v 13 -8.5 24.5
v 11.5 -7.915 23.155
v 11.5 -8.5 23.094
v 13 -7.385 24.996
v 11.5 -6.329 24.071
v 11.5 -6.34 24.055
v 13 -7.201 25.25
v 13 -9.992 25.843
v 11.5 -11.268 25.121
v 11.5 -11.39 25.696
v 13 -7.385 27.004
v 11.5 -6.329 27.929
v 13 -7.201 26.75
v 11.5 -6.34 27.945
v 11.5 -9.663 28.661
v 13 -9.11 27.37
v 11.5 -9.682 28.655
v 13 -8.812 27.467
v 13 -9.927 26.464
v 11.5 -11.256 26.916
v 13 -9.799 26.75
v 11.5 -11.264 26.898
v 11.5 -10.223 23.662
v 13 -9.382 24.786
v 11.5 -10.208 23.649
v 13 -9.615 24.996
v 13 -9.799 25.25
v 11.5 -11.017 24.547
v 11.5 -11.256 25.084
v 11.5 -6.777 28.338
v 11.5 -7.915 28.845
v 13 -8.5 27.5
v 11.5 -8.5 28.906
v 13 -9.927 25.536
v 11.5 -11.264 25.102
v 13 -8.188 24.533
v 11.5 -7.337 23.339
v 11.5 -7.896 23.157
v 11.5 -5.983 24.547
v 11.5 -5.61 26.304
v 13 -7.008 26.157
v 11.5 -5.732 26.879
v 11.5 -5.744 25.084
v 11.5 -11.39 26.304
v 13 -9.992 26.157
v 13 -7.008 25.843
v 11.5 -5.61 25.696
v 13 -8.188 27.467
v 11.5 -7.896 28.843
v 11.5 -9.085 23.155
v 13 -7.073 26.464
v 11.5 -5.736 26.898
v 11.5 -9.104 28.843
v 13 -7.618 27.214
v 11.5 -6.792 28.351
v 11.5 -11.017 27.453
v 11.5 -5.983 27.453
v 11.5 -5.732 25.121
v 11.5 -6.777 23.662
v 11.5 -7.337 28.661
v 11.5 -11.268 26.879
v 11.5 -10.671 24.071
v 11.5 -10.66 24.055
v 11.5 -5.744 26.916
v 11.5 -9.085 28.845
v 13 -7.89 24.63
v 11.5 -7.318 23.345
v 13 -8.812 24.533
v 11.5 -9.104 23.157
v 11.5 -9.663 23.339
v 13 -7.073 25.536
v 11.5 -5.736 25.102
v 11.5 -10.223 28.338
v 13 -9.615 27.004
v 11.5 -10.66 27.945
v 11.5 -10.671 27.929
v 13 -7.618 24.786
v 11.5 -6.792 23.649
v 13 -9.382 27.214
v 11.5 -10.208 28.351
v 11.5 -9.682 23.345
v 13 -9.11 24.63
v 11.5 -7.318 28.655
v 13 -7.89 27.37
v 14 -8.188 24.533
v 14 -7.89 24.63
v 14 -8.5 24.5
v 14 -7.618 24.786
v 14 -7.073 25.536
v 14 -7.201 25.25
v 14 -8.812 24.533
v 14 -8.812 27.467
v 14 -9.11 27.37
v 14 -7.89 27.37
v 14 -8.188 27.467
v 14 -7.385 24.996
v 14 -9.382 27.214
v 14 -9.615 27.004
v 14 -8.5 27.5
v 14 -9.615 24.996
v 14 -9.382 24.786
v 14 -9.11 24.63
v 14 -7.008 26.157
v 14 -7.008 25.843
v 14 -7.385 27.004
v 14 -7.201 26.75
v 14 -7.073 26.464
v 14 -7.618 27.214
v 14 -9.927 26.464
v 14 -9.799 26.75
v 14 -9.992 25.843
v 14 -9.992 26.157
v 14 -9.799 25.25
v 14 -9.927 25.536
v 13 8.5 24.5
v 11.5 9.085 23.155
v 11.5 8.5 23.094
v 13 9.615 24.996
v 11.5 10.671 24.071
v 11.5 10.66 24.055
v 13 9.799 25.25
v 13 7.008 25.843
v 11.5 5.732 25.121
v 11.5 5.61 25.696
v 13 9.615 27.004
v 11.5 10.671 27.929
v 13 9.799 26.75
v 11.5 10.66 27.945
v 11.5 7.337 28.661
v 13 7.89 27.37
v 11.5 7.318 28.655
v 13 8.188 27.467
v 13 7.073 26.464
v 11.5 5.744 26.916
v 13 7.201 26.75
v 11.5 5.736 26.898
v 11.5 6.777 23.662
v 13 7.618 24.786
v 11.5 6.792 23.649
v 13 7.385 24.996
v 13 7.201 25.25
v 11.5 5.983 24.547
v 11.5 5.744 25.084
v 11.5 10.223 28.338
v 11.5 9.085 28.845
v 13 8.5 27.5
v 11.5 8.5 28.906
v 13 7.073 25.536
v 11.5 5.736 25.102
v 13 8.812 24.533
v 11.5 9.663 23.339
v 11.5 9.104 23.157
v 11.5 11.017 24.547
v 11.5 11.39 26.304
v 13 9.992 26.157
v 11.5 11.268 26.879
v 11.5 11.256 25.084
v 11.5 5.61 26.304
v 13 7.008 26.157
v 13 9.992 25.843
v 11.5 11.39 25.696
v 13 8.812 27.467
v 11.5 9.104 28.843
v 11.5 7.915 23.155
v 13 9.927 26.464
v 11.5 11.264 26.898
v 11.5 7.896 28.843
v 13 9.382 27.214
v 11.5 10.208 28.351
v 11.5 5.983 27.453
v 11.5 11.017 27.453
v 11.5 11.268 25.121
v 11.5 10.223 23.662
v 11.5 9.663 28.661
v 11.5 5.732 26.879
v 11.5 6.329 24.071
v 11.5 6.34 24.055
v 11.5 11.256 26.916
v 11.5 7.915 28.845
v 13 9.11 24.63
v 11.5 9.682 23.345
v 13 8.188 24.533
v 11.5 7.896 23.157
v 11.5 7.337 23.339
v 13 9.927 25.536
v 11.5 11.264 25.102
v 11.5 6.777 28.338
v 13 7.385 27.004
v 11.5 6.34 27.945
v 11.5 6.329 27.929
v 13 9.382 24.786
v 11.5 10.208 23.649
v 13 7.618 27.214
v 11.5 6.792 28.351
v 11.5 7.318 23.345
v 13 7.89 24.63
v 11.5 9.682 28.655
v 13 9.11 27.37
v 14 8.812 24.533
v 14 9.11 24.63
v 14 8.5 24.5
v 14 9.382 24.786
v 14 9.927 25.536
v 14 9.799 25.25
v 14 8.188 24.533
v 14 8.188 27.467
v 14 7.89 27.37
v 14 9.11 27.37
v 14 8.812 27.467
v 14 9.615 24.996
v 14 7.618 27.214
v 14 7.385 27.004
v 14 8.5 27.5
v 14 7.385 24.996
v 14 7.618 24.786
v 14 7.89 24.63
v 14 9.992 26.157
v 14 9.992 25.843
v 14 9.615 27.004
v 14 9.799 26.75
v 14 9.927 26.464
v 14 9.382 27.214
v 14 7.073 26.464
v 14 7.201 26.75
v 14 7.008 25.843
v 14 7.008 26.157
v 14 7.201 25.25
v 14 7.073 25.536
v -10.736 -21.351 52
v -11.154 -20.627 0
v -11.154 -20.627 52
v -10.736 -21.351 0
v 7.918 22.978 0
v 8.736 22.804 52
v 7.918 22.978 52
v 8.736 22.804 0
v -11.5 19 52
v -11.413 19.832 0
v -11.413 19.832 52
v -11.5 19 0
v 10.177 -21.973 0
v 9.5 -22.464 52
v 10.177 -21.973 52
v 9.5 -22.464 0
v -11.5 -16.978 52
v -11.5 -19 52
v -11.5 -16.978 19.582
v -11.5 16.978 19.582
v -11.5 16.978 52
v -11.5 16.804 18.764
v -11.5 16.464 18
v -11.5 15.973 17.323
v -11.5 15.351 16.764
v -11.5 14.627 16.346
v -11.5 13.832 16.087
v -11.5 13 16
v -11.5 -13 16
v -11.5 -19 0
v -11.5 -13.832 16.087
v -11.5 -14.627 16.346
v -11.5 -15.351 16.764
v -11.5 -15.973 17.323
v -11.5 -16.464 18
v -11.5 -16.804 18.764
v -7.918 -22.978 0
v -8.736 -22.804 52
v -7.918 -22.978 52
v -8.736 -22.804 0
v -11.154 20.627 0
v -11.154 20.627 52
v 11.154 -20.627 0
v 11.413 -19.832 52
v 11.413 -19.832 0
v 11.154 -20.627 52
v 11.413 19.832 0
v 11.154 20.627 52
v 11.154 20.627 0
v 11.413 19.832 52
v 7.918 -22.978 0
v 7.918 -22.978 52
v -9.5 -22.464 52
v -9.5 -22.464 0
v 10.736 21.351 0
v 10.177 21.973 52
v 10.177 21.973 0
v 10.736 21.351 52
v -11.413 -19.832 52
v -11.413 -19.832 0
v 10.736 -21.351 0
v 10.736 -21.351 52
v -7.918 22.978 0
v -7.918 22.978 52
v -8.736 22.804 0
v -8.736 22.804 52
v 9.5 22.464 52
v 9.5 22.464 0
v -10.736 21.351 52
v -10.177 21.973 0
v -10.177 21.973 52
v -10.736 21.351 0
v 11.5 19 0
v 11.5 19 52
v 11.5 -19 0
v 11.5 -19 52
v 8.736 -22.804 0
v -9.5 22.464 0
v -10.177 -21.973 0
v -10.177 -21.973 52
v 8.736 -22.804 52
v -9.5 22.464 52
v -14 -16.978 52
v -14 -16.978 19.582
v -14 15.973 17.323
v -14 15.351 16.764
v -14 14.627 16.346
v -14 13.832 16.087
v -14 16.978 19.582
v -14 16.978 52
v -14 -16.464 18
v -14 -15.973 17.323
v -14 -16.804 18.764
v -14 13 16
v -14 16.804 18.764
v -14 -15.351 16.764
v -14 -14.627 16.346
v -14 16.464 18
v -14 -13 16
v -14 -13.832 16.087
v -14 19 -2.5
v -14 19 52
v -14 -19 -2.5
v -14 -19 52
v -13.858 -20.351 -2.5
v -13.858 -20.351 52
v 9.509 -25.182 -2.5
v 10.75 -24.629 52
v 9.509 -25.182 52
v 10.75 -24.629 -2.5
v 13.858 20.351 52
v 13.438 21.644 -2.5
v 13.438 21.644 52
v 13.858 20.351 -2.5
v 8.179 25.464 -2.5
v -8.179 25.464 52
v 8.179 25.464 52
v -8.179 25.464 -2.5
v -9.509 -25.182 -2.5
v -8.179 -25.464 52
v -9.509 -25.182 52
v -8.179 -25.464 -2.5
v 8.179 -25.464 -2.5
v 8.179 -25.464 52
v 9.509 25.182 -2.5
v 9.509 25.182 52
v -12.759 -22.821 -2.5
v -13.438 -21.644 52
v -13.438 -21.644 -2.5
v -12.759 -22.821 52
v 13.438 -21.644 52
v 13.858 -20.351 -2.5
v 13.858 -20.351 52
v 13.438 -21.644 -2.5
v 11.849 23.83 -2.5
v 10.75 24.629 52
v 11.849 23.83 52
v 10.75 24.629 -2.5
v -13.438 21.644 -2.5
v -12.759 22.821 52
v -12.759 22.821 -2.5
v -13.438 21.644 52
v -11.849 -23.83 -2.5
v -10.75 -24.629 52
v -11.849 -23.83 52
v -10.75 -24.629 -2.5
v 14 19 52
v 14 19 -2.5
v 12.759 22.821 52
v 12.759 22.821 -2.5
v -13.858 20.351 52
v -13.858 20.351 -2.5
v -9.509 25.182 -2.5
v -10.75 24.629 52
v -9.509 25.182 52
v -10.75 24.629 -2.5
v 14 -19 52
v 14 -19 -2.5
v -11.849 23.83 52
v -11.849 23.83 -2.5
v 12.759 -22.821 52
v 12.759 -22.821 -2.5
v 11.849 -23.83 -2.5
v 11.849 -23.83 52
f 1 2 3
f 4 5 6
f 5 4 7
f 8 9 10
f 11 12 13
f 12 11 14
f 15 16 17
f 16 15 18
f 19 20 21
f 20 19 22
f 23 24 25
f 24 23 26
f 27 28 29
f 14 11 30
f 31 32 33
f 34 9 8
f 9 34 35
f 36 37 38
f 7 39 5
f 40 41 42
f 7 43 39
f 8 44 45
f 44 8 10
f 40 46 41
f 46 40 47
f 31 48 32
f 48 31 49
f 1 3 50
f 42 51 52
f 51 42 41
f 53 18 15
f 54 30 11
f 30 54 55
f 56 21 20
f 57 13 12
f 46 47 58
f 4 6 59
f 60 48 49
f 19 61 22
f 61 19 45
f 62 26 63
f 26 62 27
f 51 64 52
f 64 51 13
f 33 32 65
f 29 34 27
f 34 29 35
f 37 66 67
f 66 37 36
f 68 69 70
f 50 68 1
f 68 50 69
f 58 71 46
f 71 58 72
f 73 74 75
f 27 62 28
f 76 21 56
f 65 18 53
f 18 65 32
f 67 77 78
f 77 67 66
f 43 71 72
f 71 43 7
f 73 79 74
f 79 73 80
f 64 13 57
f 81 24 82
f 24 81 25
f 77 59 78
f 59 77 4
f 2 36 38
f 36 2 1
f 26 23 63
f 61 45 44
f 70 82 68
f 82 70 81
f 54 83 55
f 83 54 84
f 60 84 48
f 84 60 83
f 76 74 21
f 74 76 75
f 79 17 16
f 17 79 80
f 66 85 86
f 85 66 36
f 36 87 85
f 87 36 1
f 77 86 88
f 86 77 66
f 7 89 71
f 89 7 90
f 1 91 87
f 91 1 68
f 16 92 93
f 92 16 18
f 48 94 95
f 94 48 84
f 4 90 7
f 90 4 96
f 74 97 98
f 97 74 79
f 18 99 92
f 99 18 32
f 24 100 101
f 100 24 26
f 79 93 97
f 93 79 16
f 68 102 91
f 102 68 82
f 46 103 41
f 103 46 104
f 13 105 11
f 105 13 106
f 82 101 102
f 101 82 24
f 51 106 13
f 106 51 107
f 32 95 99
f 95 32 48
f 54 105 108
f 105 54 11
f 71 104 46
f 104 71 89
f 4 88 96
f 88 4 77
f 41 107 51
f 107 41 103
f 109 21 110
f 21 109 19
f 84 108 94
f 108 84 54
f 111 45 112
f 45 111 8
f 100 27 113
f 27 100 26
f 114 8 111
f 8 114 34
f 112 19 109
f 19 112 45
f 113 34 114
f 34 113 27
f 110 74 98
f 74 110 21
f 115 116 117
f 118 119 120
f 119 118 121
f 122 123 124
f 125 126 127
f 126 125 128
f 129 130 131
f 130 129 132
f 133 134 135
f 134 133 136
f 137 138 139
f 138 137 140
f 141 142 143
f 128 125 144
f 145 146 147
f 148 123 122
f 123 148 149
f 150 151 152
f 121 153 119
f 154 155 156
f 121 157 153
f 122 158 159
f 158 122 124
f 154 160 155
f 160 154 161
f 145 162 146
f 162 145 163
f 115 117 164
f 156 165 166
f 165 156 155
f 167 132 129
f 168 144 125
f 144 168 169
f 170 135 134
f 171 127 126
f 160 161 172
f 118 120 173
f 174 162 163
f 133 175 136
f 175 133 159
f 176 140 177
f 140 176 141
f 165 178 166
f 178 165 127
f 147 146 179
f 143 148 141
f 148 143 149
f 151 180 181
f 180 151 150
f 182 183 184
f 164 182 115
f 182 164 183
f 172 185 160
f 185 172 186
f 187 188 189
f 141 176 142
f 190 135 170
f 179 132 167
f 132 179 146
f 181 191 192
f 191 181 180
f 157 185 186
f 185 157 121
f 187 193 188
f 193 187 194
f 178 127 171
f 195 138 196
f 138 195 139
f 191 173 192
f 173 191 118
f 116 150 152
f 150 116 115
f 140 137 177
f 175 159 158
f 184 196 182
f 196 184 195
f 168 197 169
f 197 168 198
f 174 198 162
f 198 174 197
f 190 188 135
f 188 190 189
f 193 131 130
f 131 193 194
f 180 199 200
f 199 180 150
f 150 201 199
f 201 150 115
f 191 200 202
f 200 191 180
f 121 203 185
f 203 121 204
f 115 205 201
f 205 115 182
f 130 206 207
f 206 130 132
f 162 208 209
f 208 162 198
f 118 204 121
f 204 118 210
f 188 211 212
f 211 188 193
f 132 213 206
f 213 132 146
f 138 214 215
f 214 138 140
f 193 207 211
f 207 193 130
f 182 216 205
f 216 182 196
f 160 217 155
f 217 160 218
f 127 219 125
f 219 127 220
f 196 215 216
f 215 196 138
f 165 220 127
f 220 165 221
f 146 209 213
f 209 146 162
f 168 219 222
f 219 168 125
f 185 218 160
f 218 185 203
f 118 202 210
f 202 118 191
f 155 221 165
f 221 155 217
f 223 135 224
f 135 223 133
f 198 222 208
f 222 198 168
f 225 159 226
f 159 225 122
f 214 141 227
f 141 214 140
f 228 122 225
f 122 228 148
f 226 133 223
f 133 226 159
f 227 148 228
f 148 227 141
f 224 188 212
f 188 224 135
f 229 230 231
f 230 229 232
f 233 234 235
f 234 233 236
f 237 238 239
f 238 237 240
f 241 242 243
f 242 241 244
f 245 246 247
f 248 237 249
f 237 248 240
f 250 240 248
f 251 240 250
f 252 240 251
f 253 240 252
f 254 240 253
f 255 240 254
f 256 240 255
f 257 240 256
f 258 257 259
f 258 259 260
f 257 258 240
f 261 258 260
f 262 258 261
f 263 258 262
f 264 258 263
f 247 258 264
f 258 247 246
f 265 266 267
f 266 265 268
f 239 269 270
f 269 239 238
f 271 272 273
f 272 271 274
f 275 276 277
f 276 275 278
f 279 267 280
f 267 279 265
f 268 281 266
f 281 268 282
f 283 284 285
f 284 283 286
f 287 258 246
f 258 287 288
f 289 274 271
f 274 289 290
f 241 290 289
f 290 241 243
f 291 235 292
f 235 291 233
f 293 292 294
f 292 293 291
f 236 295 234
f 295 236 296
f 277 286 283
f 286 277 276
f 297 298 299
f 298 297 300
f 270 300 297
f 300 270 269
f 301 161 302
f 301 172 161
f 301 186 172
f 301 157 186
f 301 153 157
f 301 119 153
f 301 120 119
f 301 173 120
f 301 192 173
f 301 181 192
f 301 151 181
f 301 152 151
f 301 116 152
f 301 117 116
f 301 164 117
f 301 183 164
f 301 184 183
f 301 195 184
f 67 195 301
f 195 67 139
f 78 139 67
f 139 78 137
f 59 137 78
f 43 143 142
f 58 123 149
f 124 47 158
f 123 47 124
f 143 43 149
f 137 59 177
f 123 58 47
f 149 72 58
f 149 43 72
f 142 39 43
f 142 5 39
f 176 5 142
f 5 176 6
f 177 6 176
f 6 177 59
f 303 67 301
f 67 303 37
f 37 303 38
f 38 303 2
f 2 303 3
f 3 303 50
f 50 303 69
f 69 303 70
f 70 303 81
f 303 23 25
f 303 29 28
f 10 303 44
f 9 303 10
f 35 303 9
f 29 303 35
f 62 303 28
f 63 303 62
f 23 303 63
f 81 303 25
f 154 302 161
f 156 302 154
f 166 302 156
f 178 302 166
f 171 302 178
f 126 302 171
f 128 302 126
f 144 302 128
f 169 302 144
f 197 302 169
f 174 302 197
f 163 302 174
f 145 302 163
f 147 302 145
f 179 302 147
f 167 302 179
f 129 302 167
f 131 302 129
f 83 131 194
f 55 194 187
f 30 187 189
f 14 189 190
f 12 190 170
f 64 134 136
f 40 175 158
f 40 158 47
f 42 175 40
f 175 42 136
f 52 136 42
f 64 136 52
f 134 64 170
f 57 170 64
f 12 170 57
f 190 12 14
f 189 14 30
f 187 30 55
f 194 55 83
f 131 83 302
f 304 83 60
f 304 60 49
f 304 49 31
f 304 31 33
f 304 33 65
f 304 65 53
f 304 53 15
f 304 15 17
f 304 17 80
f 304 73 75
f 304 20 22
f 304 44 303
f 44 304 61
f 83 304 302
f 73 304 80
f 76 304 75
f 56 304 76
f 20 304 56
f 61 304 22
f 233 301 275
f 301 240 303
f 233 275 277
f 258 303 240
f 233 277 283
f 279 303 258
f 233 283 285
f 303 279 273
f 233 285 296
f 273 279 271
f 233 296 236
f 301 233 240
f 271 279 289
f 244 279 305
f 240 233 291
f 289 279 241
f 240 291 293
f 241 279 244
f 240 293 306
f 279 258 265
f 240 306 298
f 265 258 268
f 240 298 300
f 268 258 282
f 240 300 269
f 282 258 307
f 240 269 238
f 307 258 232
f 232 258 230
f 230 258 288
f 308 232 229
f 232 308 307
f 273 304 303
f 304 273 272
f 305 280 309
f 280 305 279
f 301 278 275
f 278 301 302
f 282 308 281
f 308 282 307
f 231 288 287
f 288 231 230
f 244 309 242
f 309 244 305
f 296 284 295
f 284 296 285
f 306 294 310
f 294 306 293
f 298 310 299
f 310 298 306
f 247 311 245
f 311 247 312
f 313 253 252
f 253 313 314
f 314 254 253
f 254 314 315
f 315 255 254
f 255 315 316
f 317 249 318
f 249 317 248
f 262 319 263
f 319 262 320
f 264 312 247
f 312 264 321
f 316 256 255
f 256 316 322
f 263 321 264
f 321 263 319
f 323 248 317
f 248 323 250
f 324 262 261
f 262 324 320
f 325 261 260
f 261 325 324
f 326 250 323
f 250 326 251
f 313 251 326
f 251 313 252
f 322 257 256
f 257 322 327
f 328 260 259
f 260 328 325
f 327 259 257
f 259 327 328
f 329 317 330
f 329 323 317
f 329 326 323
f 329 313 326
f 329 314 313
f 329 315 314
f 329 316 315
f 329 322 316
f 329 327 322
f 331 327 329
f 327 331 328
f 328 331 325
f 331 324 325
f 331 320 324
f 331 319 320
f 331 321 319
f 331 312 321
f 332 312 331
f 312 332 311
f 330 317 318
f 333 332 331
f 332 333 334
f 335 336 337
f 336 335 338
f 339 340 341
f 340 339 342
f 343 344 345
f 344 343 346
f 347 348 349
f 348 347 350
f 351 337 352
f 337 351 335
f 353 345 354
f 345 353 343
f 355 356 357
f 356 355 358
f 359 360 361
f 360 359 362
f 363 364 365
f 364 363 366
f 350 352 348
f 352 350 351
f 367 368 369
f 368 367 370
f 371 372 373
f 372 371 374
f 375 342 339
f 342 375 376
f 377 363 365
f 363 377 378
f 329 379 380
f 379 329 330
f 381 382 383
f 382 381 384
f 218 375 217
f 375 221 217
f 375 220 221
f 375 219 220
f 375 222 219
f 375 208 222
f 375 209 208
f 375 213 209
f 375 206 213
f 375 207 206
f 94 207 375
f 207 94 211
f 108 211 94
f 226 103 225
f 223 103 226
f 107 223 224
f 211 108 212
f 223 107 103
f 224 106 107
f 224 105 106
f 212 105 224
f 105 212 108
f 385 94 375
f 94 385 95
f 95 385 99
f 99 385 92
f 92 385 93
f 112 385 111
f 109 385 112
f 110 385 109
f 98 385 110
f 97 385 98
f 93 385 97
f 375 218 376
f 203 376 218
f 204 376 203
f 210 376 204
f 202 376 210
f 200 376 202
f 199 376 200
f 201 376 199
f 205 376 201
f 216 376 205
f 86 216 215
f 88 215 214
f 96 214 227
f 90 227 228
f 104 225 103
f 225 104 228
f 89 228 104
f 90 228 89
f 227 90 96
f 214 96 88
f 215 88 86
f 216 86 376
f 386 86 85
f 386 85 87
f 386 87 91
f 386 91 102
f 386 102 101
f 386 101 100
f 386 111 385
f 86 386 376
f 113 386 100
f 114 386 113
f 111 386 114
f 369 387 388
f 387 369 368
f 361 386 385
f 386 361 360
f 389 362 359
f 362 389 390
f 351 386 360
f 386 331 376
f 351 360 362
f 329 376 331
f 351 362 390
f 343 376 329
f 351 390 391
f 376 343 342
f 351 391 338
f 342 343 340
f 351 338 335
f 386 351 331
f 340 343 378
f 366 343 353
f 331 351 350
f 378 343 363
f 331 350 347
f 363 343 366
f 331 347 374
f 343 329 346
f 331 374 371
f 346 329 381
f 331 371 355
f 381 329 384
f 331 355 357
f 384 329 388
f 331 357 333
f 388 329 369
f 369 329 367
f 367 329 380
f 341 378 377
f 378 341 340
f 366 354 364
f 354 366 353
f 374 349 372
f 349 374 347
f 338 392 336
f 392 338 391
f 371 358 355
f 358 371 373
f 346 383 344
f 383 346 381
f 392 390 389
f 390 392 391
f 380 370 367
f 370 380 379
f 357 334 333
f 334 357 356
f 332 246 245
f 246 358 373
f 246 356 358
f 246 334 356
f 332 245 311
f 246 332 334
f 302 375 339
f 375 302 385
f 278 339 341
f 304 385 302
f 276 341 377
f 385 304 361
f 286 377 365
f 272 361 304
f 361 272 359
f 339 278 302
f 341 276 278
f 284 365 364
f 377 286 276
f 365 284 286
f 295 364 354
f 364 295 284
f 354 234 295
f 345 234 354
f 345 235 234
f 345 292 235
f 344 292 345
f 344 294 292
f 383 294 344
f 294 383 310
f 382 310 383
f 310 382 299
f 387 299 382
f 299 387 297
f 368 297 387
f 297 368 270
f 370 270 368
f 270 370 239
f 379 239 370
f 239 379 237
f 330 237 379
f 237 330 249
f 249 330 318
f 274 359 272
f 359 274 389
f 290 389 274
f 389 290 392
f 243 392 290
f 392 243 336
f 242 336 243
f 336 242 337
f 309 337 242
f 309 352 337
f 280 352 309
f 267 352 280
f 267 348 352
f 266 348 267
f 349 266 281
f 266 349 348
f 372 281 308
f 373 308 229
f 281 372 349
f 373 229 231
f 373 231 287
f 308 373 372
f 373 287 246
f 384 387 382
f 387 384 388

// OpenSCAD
//
//  wall holder for aircond remote control
//
//  design by egil kvaleberg, 5 october 2016
//
//  added support for chamfer
//

// size of compartment
comp_w = 46;
comp_d = 23;
comp_h = 52;
// width of front slot
slot_w = 34;
// width of slot lower lip
slot_lower = 16; 
// corner radius of compartment
corner_r = 4;
// wall thickness of comparement
wall = 2.5;
// chamfer for top entry and bottom (typical value is 0.6)
chamfer = 0.0;
// diameter of mounting screws
mnt_dia = 2.5;

// generic tolerance
tol = 0.25;

d = 1*0.1;

module add() {
    // chamfered bottom section
    if (chamfer > 0) hull() for (sx = [-1,1]) for (sy = [-1,1]) 
        translate([sx*(comp_d/2-corner_r),sy*(comp_w/2-corner_r),-wall]) {
            cylinder(r1=wall+corner_r-chamfer, r2=wall+corner_r, h=chamfer, $fn=30);
        }   
    // main section    
    hull() for (sx = [-1,1]) for (sy = [-1,1]) 
        translate([sx*(comp_d/2-corner_r),sy*(comp_w/2-corner_r),chamfer-wall]) {
            cylinder(r=wall+corner_r, h=wall+comp_h-chamfer, $fn=30);
        }   
}

module sub() {
    // main compartment 
    hull () for (sx = [-1,1]) for (sy = [-1,1]) 
        translate([sx*(comp_d/2-corner_r),sy*(comp_w/2-corner_r),0]) {
            cylinder(r=corner_r, h=comp_h+d, $fn=30);
    }
    // main compartment, chamfered section
    if (chamfer > 0) hull () for (sx = [-1,1]) for (sy = [-1,1]) 
        translate([sx*(comp_d/2-corner_r),sy*(comp_w/2-corner_r),comp_h-chamfer]) {
            translate([0,0,]) cylinder(r1=corner_r, r2=corner_r+chamfer+d, h=chamfer+d, $fn=30);
    }
    // slot in front
    translate ([0,0,slot_lower+comp_h/2]) rotate([0,-90,0]) hull () for (sx = [-1,1]) for (sy = [-1,1]) 
        translate([sx*(comp_h/2-corner_r),sy*(slot_w/2-corner_r),0]) {
            cylinder(r=corner_r, h=comp_h+d, $fn=30);
    }
    // mounting holes
    translate ([comp_d/2-d,0,comp_h/2]) rotate([0,90,0]) for (sy = [-1,1]) 
        translate([0,sy*slot_w/4,0]) {
            cylinder(d1=mnt_dia+2*tol+2*wall*0.6, d2=mnt_dia+2*tol, h=d+wall*0.6, $fn=30);
            cylinder(d=mnt_dia+2*tol, h=d+wall+d, $fn=30);
    }   
}
    // mounting holes
    if (0) color("red") translate ([comp_d/2-d,0,comp_h/2]) rotate([0,90,0]) for (sy = [-1,1]) 
        translate([0,sy*slot_w/4,0]) {
            cylinder(d=mnt_dia+2*tol, h=d+wall+d, $fn=30);
    } 

    // main structure:
    difference () {
        color("red") add();
        difference () {
            sub();
            //
        }
    }
